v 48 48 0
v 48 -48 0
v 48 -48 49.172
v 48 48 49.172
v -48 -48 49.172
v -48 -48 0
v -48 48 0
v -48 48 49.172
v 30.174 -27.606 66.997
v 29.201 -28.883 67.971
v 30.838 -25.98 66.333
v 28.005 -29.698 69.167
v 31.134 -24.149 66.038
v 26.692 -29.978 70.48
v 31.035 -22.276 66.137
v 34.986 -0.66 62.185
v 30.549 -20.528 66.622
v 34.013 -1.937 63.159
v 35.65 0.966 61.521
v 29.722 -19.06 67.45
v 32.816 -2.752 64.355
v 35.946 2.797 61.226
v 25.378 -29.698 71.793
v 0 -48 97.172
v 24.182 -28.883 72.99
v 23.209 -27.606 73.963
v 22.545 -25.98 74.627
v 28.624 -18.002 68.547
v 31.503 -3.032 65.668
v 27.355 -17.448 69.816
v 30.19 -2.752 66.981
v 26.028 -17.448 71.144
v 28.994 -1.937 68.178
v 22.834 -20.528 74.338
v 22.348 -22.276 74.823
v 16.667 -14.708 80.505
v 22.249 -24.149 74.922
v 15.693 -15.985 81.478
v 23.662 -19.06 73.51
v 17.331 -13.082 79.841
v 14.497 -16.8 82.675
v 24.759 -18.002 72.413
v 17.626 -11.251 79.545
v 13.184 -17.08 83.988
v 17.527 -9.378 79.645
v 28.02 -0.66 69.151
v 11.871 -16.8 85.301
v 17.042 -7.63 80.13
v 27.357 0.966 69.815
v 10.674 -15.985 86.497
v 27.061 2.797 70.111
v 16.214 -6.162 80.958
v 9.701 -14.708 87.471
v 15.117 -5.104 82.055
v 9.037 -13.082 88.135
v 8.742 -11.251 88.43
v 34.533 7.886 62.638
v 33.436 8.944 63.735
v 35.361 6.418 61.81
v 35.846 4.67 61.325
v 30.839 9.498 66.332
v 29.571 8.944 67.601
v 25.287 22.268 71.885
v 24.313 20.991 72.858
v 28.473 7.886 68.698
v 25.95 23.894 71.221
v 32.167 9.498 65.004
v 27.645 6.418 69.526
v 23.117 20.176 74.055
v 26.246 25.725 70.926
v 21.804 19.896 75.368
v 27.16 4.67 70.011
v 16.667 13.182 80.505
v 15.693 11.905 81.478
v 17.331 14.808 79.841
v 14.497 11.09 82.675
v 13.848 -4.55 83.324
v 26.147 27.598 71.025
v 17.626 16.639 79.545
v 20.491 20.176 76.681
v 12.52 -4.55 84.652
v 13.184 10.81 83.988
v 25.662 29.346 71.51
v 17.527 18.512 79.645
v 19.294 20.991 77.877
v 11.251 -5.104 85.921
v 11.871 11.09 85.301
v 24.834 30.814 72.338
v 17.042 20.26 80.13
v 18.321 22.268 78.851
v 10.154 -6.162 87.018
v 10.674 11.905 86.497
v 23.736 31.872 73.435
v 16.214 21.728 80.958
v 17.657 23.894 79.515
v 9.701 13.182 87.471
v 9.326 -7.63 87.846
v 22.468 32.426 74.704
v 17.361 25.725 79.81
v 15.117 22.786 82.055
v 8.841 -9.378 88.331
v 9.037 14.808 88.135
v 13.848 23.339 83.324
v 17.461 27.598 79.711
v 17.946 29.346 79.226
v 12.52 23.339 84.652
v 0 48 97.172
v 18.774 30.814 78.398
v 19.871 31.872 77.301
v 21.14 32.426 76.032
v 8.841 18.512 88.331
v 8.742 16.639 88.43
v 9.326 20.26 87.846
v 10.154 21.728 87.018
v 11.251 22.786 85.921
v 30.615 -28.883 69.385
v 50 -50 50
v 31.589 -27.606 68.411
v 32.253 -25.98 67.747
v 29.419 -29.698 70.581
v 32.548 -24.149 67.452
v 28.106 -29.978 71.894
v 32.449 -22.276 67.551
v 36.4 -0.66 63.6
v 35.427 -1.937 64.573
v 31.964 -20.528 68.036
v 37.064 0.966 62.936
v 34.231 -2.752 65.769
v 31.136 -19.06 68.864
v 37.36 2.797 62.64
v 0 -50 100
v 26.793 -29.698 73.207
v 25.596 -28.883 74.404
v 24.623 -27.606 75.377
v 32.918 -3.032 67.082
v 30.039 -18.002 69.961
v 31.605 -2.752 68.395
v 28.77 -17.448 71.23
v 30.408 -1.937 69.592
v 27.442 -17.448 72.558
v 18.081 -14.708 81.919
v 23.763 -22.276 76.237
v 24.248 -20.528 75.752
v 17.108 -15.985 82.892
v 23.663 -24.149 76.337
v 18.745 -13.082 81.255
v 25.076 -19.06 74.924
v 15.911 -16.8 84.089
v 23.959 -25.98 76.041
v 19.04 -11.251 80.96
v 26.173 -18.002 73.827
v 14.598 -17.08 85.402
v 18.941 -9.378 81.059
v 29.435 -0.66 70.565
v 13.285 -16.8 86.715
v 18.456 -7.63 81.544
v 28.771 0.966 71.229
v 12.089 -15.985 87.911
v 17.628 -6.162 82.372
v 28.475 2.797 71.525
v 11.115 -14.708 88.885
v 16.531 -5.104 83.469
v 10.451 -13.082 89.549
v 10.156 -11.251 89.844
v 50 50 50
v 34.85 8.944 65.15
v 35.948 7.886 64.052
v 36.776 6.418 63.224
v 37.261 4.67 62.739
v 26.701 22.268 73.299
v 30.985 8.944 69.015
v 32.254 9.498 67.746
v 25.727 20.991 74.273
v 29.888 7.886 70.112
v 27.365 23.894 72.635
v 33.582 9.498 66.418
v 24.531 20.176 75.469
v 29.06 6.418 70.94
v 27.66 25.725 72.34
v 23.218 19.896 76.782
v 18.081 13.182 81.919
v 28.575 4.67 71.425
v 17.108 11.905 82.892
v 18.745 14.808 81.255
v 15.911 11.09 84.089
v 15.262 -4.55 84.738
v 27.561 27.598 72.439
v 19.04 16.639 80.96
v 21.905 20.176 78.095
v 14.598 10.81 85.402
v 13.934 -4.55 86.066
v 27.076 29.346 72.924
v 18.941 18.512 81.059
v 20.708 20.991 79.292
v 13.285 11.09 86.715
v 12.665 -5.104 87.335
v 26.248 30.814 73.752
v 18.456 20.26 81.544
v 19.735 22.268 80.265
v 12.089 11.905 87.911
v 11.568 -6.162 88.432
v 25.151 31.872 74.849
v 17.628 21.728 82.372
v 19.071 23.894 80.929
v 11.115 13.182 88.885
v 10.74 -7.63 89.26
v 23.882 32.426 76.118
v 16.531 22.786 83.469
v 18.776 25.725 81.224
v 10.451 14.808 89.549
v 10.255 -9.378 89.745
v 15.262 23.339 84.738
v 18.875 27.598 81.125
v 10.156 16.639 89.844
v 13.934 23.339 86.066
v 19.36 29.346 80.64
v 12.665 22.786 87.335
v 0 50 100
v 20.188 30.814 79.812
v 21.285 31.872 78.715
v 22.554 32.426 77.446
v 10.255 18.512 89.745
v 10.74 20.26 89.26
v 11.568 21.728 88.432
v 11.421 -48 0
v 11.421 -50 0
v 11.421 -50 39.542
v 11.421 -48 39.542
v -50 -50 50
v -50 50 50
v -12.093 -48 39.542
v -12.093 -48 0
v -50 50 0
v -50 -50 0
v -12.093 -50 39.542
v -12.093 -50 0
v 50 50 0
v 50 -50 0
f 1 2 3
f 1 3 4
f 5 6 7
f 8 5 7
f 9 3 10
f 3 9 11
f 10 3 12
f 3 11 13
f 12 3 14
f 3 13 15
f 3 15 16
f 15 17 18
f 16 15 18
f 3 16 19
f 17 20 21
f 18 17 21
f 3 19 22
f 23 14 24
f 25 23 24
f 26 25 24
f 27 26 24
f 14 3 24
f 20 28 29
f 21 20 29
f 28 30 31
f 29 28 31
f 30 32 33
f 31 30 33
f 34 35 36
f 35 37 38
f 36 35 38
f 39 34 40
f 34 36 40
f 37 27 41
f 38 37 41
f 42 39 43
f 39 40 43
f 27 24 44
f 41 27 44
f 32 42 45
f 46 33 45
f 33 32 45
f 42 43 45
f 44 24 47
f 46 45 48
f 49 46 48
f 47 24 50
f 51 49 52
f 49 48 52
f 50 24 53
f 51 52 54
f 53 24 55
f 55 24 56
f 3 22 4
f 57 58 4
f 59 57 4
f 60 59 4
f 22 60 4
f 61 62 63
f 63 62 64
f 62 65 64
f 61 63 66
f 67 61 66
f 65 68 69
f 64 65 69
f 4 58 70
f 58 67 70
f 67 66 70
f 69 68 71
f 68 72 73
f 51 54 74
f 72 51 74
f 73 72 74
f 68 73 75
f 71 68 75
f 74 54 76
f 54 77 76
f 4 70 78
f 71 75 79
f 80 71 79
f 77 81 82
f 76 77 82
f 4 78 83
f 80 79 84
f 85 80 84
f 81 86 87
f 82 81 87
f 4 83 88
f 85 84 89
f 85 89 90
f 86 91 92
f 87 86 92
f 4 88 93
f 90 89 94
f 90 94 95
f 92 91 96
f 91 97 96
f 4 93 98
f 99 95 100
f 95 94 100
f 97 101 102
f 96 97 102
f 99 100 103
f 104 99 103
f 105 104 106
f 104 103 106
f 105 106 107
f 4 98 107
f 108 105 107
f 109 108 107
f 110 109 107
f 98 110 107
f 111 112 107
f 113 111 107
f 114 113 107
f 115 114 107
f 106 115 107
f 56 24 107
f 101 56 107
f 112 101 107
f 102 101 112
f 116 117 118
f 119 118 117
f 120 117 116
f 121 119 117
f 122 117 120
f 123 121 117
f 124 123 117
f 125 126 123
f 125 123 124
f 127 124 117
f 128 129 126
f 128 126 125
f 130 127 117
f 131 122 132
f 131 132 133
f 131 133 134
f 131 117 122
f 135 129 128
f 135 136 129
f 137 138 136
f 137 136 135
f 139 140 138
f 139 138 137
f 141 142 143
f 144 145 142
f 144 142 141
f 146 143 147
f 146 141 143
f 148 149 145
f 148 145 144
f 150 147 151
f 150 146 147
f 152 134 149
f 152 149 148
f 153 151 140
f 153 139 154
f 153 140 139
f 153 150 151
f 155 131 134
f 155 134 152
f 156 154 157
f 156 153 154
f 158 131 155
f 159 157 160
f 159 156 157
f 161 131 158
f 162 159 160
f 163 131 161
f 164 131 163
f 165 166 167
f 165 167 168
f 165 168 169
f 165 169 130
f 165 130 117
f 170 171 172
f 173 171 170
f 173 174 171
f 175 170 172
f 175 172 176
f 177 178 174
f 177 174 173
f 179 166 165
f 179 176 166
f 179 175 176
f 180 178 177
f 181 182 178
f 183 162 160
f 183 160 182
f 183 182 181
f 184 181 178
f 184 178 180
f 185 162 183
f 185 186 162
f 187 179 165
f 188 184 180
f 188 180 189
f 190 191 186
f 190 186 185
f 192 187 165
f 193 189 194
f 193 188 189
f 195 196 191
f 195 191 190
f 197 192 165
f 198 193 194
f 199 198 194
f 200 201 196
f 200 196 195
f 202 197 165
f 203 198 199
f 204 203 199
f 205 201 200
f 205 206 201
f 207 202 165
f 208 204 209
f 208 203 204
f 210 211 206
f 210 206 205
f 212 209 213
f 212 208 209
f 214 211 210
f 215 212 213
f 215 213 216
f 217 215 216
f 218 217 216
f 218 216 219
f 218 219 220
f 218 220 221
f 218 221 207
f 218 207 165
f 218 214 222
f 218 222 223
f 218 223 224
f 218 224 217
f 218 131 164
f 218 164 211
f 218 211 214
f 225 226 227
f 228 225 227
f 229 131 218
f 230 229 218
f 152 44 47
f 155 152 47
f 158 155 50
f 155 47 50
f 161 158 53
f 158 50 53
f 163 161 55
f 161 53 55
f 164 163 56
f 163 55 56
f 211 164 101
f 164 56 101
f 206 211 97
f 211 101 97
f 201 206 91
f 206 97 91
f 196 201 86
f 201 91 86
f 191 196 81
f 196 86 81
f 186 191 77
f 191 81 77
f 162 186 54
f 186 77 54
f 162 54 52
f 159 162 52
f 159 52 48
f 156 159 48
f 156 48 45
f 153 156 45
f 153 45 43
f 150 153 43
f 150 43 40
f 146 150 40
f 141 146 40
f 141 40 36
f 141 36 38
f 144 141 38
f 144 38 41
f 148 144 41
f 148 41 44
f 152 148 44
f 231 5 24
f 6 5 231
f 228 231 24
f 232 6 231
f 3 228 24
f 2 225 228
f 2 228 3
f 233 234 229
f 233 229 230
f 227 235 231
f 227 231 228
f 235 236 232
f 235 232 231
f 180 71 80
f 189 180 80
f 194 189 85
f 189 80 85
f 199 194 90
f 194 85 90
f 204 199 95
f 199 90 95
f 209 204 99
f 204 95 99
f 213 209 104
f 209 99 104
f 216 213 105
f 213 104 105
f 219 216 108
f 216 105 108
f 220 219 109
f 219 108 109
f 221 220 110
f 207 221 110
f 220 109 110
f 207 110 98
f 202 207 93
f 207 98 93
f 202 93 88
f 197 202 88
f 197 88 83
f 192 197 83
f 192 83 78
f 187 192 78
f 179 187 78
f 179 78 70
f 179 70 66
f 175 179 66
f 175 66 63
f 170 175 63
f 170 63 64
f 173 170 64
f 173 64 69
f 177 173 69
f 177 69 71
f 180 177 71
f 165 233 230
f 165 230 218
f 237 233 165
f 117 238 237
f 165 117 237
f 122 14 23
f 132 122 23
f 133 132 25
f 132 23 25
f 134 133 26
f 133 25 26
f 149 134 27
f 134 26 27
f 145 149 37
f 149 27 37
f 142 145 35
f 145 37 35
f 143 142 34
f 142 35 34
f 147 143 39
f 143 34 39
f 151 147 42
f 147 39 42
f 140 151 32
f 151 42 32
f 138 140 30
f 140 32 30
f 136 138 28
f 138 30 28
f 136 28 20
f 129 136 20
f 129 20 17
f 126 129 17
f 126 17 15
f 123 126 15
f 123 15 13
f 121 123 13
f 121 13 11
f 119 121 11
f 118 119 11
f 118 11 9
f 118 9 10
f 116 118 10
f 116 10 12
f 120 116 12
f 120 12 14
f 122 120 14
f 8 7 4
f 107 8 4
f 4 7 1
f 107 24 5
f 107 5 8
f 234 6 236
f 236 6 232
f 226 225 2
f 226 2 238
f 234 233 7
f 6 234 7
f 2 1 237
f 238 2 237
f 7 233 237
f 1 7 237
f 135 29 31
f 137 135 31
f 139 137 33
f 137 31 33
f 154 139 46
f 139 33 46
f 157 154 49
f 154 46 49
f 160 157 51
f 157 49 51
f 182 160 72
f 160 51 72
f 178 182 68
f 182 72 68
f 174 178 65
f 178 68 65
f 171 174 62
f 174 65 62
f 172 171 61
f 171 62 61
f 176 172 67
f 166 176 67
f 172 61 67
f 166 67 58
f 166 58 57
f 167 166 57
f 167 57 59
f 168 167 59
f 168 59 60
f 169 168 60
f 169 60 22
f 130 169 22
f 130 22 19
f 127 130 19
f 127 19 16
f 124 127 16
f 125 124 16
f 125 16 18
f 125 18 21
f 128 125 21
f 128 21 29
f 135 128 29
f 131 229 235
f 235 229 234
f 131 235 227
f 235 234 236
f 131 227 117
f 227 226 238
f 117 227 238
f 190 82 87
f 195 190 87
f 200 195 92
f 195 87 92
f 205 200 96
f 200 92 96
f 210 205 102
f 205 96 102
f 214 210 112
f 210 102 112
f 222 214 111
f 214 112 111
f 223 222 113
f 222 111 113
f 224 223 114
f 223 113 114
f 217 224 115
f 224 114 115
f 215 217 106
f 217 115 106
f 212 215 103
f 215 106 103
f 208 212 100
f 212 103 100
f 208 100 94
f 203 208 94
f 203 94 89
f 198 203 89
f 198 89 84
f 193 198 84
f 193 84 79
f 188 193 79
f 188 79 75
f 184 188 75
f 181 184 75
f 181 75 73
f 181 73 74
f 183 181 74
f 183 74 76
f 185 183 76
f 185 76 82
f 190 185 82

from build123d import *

# Parameters (mm, degrees)
F0_W     = 100
F0_H     = 100
F1_DEPTH = 100
F2_SIZE2 = 49.99999
F2_SIZE  = 49.99999
F3_T     = -2
F4_W     = 23.5146284103
F4_H     = 39.5418182015
F5_DEPTH = 2
F7_D     = 12.6
F7_DEPTH = 17.25
F7_TIP   = 3.7854218999


# Not quite as in the source:
# - a fillet or chamfer is up to 0.001 mm smaller than in the source, because OpenCascade refuses the exact size


with BuildPart() as f1:
    # F0 (on Top) → F1 (new body)
    with BuildSketch(Plane.XY):
        Rectangle(F0_W, F0_H)
    extrude(amount=F1_DEPTH)

    # F2 (size 50 and 50 in the source; OpenCascade refuses exactly that, so slightly less here)
    f2_edges = [f1.edges().sort_by_distance(p)[0] for p in [
        (-50, 0, 100),
        (50, 0, 100),
    ]]
    chamfer(f2_edges, length=F2_SIZE, length2=F2_SIZE2)

    # F3
    f3_openings = [f1.faces().sort_by_distance(p)[0] for p in [
        (0, 0, 0),
    ]]
    offset(amount=F3_T, openings=f3_openings)

    # F4 (on face) → F5 (cut, through all)
    with BuildSketch(Plane.XZ.offset(50)):
        with Locations((-0.3359224647, 19.7709091008)):
            Rectangle(F4_W, F4_H)
    extrude(amount=-F5_DEPTH, mode=Mode.SUBTRACT)

    # F7
    with Locations(Plane(origin=(50, 0, 50), x_dir=(0, 1, 0), z_dir=(0.7071067812, 0, 0.7071067812))):
        with Locations((17.1098317951, 50.0659272075), (-10.7799200341, 50.0659272075), (-23.6778985709, 30.9631545097), (3.2679832075, 24.1581760347), (26.1959340423, 37.8756783903)):
            Hole(F7_D / 2, depth=F7_DEPTH)
            with Locations((0, 0, -(F7_DEPTH + F7_TIP / 2))):  # 118° drill point
                Cone(0, F7_D / 2, F7_TIP, mode=Mode.SUBTRACT)


solid = f1.part
